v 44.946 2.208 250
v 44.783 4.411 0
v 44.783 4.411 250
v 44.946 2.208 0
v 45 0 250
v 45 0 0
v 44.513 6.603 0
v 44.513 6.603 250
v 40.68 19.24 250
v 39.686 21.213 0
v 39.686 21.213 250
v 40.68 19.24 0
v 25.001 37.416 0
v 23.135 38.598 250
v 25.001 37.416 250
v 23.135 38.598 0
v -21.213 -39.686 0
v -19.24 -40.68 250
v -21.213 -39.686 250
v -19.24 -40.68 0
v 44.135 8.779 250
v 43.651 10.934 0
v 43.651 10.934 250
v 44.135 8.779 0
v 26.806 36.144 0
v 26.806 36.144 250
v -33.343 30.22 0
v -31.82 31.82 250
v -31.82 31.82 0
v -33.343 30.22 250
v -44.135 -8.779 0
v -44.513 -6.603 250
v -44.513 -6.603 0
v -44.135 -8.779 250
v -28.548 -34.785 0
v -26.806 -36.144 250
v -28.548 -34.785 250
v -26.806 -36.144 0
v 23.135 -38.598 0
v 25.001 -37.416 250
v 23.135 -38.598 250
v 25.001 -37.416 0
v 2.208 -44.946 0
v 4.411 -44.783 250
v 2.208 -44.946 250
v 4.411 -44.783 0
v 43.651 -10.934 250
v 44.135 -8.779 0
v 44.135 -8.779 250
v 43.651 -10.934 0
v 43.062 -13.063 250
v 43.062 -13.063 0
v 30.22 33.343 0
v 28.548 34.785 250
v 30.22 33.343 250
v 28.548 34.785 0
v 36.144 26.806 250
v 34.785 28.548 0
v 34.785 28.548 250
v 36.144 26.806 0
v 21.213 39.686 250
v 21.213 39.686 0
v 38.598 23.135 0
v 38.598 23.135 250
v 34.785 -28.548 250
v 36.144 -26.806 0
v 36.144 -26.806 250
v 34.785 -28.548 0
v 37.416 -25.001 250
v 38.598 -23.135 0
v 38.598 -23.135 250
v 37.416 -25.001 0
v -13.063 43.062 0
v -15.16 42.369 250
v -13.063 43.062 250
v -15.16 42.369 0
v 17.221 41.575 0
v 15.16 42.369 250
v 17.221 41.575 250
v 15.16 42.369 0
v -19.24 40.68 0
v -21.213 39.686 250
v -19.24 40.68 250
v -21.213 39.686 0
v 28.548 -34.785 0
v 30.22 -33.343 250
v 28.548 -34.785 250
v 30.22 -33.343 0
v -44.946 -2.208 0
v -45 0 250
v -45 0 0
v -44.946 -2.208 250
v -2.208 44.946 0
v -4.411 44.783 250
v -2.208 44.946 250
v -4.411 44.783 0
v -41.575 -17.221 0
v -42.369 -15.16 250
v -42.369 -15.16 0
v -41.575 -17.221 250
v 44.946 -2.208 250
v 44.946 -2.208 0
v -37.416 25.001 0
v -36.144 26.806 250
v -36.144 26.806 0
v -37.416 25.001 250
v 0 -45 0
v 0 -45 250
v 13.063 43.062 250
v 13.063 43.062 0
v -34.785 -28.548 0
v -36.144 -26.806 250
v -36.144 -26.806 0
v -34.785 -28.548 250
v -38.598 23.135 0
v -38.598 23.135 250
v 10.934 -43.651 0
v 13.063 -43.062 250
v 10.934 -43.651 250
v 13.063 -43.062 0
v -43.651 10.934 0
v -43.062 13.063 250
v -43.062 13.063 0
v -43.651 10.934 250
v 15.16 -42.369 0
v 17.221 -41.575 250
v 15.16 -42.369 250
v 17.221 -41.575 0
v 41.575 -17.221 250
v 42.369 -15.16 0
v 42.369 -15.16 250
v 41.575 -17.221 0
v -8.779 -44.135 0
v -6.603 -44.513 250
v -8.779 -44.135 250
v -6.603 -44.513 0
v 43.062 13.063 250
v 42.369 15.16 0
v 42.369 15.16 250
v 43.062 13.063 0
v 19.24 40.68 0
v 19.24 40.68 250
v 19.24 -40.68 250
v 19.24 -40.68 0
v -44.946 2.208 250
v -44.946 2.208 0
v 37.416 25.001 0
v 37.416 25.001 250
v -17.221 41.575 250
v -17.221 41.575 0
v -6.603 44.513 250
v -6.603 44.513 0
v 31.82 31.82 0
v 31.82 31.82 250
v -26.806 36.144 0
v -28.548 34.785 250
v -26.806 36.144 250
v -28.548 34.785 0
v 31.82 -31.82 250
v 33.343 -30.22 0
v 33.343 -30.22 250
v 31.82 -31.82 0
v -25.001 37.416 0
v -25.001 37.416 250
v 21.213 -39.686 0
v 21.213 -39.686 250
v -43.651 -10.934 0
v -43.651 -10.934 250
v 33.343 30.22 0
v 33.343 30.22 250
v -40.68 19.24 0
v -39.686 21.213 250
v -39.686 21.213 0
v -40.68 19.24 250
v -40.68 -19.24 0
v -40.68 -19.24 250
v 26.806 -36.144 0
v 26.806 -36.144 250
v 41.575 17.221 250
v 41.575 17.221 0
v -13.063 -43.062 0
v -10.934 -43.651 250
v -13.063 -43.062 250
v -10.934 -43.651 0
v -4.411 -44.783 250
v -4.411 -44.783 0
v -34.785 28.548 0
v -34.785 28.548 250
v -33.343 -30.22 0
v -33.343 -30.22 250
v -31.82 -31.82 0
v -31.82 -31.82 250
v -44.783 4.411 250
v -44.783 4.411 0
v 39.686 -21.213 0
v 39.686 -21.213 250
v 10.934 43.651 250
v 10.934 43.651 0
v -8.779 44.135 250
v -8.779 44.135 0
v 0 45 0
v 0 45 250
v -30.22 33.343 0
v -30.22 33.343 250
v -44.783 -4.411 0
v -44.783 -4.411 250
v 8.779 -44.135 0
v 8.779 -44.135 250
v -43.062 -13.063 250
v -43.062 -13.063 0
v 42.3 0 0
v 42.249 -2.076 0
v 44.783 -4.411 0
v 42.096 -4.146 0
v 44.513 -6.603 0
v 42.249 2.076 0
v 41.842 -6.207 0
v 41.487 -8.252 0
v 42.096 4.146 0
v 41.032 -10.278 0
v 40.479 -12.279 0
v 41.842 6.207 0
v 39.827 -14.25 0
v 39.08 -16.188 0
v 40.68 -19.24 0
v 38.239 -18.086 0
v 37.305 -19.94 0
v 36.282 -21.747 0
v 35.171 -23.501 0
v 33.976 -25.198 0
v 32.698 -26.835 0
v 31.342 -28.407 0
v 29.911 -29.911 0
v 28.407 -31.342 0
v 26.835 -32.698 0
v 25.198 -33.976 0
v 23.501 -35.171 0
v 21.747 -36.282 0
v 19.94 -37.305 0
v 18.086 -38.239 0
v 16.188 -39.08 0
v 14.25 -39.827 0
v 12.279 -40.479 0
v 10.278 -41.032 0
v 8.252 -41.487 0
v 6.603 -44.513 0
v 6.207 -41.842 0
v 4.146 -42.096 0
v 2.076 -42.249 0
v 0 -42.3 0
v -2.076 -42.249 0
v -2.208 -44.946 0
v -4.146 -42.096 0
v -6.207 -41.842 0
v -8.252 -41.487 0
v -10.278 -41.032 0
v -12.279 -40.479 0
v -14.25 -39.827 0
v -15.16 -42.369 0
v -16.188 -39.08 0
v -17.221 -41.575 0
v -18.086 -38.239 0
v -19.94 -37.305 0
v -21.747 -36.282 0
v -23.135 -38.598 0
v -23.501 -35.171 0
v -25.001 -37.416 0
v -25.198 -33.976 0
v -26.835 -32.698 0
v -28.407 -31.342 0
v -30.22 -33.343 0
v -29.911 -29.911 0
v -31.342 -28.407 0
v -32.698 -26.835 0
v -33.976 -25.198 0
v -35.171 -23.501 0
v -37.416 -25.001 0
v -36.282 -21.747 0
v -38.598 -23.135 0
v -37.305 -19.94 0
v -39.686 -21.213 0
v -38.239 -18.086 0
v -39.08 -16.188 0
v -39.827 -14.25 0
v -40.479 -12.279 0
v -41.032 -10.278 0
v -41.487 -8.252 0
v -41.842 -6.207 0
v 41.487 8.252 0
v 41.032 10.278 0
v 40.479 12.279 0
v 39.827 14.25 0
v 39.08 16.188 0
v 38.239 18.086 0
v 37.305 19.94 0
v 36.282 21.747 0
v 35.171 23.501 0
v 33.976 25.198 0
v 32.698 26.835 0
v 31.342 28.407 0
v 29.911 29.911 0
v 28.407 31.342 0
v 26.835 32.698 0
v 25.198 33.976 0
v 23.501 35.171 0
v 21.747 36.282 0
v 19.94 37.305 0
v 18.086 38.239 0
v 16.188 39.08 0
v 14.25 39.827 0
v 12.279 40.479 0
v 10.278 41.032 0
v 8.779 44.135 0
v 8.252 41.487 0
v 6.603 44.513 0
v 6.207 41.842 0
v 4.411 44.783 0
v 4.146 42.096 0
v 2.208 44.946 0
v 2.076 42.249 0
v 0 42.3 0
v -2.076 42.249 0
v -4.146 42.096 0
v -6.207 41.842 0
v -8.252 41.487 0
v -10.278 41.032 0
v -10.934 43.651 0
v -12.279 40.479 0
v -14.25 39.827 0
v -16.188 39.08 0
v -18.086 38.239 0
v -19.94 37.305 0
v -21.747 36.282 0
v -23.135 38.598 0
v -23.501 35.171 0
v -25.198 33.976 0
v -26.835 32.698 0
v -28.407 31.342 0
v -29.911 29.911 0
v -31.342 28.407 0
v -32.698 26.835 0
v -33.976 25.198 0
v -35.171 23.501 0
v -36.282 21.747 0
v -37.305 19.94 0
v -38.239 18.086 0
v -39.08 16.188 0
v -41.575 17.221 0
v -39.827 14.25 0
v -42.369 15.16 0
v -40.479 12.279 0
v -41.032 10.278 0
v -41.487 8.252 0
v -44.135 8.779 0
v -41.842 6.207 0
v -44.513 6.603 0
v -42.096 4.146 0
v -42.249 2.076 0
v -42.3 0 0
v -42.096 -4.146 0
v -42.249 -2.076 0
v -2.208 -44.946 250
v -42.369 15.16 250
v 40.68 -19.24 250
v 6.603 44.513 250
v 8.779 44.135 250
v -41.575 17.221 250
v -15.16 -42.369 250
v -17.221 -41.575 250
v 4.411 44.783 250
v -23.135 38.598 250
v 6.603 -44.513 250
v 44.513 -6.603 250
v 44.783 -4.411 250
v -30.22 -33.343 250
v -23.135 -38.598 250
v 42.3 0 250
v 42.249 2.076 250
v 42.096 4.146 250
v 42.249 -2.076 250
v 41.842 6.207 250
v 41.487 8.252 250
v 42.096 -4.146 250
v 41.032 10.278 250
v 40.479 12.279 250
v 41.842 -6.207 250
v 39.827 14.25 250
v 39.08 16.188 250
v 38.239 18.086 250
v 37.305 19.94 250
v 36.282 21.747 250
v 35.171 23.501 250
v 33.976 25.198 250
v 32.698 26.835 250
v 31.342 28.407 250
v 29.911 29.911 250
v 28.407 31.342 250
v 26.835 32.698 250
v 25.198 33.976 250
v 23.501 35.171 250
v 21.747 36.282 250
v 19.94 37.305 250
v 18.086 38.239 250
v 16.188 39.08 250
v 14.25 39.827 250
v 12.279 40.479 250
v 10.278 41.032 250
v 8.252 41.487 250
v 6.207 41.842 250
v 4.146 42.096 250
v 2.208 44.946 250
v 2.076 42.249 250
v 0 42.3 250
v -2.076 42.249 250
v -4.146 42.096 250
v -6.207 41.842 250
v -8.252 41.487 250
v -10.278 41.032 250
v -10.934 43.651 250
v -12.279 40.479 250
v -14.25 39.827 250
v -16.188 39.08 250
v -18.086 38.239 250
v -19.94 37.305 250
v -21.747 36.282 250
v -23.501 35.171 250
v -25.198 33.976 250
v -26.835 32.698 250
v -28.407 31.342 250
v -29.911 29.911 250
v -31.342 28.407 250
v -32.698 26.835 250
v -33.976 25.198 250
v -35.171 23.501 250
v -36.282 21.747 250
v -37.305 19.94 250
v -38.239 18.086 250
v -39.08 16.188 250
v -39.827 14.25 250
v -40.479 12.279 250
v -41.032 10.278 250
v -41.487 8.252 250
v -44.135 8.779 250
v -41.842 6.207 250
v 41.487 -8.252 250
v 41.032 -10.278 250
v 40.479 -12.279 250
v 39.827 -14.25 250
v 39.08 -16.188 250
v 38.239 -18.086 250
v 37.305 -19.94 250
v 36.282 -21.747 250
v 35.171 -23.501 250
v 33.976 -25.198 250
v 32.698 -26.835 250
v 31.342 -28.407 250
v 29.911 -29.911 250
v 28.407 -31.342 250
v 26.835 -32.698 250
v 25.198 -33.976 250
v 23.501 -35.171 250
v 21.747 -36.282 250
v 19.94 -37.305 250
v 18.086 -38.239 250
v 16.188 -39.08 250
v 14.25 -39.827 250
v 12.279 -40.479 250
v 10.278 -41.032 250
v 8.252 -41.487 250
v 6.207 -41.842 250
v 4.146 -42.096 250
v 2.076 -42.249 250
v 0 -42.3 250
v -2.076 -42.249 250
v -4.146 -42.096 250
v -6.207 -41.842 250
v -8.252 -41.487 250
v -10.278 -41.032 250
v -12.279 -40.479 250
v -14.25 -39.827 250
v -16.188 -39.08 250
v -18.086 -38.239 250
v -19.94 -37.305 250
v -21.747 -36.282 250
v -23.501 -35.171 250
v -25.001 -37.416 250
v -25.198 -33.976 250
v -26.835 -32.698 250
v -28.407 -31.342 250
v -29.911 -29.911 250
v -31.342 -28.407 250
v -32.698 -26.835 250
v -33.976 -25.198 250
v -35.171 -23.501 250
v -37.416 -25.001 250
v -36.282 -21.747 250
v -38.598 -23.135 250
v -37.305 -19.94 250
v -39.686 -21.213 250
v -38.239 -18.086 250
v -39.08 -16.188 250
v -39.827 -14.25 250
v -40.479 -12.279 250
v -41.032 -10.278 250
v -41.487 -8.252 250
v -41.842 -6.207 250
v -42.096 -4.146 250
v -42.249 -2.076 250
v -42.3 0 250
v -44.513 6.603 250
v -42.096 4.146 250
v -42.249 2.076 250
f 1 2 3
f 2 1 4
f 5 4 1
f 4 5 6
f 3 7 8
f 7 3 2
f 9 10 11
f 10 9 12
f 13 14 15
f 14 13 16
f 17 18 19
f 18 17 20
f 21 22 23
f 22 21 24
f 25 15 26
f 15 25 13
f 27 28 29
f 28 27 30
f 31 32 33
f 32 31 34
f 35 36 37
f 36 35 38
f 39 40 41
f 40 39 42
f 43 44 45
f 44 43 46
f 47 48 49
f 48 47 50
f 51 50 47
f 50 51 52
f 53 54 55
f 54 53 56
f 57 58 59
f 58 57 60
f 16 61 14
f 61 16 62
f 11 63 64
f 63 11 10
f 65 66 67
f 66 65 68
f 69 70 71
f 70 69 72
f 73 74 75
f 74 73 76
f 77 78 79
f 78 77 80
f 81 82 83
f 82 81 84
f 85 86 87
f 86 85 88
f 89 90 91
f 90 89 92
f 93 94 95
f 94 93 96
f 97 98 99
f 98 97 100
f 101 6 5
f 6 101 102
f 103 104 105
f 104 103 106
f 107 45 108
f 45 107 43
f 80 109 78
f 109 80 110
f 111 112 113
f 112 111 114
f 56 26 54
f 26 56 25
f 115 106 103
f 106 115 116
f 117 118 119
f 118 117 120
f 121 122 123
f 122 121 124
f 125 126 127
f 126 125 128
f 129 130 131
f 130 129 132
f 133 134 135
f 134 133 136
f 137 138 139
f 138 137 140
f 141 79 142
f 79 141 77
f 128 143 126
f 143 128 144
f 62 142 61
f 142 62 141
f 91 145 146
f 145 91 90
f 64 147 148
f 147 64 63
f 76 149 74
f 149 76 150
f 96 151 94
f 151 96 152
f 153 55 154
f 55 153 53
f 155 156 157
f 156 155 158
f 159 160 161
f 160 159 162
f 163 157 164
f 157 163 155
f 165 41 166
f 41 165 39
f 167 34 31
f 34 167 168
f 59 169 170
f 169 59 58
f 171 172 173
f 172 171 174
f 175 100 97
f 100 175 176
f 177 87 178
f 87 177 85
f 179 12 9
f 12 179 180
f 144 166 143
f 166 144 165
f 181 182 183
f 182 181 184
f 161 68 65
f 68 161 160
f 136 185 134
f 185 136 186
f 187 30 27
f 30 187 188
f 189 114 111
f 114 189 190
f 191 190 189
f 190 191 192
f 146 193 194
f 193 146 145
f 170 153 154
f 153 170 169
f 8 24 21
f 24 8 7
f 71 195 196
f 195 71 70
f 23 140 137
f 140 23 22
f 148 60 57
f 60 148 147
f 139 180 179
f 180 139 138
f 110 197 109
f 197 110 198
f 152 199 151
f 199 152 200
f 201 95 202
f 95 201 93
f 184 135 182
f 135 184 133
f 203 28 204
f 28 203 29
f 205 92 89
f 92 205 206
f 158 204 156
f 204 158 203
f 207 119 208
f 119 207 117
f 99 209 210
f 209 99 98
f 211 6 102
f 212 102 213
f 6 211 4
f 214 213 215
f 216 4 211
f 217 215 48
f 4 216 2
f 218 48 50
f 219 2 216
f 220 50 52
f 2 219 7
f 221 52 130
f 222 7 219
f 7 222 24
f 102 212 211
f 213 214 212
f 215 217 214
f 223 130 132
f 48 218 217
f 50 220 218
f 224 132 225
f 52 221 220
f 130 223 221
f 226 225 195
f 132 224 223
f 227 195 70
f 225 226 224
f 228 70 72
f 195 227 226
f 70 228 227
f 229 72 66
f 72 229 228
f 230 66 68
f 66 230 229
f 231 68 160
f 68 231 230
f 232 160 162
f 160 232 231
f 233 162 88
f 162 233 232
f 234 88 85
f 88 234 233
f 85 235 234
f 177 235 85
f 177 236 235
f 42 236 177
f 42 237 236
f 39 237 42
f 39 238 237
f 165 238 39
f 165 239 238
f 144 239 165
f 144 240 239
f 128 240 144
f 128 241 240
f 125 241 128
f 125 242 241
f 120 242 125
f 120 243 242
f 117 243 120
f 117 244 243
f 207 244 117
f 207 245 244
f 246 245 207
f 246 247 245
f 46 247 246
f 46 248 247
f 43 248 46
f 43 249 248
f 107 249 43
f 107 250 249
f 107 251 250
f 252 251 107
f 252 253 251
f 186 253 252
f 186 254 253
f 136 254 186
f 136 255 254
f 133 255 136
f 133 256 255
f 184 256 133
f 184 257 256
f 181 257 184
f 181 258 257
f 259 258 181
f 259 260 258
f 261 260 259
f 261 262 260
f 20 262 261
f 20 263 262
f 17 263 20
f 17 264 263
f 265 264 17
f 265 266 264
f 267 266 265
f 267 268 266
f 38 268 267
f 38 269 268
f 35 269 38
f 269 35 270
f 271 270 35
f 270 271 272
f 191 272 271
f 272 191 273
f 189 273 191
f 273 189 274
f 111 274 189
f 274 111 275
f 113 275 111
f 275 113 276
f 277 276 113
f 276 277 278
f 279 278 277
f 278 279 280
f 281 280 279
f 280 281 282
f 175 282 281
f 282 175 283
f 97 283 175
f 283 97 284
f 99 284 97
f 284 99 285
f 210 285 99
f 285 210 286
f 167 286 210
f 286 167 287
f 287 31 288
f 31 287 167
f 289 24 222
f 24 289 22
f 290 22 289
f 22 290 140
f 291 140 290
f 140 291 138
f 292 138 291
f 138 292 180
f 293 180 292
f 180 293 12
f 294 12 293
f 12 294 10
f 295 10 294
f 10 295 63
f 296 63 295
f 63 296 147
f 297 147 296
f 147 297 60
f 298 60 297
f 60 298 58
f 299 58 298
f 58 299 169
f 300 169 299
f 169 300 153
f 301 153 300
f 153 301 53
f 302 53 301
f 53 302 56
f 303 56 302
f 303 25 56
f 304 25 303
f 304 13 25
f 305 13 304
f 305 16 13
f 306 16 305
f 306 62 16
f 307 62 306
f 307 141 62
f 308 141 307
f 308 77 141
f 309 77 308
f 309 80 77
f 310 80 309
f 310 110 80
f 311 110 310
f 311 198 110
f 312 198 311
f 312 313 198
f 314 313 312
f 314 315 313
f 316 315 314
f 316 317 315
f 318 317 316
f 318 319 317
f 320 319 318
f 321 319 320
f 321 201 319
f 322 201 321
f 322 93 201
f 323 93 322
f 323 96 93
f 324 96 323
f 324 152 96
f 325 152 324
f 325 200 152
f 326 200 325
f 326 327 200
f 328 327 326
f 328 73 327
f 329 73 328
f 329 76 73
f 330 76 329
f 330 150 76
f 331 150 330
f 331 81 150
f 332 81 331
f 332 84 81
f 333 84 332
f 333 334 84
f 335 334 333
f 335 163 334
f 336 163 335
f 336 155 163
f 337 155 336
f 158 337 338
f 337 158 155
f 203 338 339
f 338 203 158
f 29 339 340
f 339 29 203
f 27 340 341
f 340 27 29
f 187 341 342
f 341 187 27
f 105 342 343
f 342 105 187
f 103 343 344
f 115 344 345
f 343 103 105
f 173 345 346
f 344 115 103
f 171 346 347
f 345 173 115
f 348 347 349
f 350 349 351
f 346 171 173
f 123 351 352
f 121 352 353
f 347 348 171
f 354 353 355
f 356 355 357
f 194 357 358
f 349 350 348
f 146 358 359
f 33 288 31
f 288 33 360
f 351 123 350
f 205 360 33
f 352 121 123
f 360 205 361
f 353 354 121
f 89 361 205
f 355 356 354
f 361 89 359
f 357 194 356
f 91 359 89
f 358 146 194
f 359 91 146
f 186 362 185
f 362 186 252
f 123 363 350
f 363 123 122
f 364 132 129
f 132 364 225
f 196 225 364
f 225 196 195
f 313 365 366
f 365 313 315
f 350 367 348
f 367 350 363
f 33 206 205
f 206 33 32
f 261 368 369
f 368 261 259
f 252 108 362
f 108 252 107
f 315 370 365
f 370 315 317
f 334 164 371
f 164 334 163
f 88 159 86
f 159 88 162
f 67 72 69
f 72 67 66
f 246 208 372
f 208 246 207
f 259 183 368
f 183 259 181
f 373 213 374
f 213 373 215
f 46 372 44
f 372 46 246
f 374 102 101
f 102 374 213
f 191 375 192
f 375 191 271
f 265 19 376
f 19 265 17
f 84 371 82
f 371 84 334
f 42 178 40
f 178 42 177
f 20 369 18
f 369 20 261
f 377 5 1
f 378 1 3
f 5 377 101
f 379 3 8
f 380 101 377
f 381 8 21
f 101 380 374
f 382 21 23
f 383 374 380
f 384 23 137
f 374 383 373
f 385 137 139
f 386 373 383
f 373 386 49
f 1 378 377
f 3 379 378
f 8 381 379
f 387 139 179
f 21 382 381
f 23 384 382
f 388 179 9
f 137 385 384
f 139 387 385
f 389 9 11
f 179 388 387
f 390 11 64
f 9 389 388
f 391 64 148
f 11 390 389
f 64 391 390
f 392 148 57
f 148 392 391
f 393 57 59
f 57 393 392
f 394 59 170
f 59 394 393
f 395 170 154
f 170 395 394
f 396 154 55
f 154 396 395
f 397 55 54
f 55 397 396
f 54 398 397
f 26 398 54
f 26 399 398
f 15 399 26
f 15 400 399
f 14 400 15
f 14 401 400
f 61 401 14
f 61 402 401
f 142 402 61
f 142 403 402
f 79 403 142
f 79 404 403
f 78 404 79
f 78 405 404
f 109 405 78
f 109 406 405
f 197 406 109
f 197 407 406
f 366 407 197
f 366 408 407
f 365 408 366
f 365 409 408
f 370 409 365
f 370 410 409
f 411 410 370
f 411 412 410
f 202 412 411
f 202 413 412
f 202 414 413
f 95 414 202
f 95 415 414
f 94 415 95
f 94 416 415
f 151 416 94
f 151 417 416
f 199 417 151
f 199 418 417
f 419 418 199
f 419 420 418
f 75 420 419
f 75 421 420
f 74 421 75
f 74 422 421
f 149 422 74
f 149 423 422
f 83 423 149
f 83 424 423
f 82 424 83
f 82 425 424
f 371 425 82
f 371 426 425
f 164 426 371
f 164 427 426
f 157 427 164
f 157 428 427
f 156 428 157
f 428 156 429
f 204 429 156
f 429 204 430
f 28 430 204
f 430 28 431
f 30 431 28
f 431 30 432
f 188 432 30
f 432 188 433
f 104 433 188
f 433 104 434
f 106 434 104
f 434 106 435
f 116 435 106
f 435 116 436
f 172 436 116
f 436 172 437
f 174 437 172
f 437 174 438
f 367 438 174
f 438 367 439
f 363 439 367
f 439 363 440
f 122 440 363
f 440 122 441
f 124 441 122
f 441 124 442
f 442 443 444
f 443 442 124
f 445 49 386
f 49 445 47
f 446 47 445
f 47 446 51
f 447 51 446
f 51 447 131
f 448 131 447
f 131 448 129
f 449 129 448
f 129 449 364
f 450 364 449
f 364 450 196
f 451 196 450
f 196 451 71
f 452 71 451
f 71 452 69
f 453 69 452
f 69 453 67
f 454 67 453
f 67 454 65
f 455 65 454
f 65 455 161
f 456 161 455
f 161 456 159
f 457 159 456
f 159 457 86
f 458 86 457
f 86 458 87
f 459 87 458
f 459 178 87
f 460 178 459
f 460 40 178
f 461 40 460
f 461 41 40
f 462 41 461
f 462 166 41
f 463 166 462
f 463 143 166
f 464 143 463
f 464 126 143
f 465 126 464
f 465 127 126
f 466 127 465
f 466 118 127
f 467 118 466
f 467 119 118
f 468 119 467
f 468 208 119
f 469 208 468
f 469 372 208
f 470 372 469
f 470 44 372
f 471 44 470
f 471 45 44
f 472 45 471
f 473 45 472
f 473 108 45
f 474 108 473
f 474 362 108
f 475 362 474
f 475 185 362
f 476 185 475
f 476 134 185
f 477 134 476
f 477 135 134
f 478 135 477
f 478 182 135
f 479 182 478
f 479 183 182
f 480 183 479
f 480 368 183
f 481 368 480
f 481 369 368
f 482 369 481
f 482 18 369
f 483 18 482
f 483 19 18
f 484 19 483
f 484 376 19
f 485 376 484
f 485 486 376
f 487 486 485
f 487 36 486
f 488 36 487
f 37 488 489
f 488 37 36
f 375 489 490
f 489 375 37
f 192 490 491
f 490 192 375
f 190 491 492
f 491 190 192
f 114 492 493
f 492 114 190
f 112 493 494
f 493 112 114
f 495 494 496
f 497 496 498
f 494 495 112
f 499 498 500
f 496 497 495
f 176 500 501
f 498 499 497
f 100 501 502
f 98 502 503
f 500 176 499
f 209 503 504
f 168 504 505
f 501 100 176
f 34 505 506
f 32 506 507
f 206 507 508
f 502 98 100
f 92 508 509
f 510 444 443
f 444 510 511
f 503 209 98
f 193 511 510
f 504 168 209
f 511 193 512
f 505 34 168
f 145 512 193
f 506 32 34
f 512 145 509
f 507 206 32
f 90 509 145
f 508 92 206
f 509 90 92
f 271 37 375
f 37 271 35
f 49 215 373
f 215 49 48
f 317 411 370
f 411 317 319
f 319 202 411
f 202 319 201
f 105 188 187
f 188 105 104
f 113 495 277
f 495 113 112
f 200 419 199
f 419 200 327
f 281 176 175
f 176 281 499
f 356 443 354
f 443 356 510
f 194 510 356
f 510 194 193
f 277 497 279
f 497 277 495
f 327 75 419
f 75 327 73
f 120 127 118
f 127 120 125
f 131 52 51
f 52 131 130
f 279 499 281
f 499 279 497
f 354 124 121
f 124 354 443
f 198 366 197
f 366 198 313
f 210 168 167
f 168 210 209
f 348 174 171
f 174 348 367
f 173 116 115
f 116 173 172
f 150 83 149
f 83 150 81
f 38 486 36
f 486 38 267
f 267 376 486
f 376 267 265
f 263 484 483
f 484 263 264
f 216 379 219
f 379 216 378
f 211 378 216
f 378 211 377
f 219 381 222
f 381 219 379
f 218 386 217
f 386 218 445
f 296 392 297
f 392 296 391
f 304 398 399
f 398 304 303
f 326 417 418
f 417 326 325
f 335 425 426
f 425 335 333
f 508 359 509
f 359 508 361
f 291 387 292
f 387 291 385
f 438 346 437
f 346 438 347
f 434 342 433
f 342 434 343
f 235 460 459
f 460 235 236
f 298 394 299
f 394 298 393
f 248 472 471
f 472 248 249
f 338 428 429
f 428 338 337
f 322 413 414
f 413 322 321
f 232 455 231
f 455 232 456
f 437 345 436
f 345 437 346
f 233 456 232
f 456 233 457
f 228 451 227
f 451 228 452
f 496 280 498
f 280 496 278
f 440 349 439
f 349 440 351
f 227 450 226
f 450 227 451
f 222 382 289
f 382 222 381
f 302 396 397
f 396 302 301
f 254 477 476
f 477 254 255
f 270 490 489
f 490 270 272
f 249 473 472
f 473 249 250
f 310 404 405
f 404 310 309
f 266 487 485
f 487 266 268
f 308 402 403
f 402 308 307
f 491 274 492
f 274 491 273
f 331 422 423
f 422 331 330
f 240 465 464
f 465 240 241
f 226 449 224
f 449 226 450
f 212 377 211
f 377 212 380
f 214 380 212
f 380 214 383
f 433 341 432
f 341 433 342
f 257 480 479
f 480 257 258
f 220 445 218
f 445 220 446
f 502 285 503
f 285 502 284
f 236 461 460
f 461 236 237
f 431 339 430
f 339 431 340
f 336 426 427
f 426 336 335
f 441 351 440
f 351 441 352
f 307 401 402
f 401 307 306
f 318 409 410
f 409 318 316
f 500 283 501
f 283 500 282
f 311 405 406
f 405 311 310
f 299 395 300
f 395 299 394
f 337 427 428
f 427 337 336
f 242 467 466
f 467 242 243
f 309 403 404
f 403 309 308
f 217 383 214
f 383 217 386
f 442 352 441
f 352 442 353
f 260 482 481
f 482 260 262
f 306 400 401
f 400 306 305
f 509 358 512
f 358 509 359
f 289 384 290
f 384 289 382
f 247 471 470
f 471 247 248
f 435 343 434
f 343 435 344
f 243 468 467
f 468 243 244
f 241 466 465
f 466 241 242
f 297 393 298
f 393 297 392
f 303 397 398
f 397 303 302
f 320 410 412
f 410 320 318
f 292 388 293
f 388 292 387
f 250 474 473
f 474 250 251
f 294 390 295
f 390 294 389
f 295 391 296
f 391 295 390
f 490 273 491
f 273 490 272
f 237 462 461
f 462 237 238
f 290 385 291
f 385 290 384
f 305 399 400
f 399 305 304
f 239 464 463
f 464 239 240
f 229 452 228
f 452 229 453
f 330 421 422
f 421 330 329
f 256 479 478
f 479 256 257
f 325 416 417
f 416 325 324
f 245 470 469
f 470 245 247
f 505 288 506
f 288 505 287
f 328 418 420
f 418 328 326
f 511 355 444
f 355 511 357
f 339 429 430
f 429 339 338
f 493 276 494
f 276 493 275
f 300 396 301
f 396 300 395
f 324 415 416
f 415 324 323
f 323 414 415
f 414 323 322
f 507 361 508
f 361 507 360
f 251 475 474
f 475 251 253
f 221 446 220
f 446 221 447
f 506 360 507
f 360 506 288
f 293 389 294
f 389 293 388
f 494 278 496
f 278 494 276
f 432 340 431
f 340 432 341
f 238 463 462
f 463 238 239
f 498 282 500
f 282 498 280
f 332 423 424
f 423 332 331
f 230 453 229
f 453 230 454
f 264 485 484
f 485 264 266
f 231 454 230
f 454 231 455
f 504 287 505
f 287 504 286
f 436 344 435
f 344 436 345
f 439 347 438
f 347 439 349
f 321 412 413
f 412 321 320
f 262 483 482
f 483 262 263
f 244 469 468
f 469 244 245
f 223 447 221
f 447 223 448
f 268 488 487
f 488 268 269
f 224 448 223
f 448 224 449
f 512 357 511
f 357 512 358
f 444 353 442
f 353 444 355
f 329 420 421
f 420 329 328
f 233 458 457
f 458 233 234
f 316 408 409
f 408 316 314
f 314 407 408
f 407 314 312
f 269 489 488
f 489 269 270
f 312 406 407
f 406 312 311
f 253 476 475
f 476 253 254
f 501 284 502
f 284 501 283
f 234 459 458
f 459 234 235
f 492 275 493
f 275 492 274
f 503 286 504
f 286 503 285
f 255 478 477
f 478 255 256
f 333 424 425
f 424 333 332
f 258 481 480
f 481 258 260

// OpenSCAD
$fn = 128;

// HT 90 straight pipe, length 250 mm (approximation)
// Common HT DN90 assumptions:
// - Outer diameter: 90 mm
// - Wall thickness: 2.7 mm
// - Straight segment length: 250 mm
// - Small chamfers on both ends

od = 90;
wall = 2.7;
id = od - 2*wall;

L = 250;          // pipe length
chamfer = 1.0;    // end chamfer length
eps = 0.05;

module straight_pipe_shell(OD, ID, len) {
    // Hollow straight pipe (open at both ends)
    difference() {
        cylinder(h=len, d=OD, center=false);
        translate([0,0,-eps]) cylinder(h=len + 2*eps, d=ID, center=false);
    }
}

module end_chamfer_cutter(OD, ID, c) {
    // Cutter that creates a chamfer on a pipe end face at z=0 (pointing +z)
    union() {
        // Outer edge chamfer
        difference() {
            cylinder(h=c+eps, d=OD + 2*c, center=false);
            translate([0,0,-eps]) cylinder(h=c+3*eps, d=OD, center=false);
        }
        // Inner edge chamfer
        difference() {
            cylinder(h=c+eps, d=ID, center=false);
            translate([0,0,-eps]) cylinder(h=c+3*eps, d=max(0.01, ID - 2*c), center=false);
        }
    }
}

module ht_90_pipe_250(OD=od, ID=id, len=L, c=chamfer) {
    // One connected solid: straight hollow pipe with chamfers on both ends
    difference() {
        straight_pipe_shell(OD, ID, len);

        // Chamfer at start (z=0)
        translate([0,0,-eps])
            end_chamfer_cutter(OD, ID, c);

        // Chamfer at end (z=len), cutter points -z
        translate([0,0,len + eps])
            mirror([0,0,1])
                end_chamfer_cutter(OD, ID, c);
    }
}

ht_90_pipe_250();
